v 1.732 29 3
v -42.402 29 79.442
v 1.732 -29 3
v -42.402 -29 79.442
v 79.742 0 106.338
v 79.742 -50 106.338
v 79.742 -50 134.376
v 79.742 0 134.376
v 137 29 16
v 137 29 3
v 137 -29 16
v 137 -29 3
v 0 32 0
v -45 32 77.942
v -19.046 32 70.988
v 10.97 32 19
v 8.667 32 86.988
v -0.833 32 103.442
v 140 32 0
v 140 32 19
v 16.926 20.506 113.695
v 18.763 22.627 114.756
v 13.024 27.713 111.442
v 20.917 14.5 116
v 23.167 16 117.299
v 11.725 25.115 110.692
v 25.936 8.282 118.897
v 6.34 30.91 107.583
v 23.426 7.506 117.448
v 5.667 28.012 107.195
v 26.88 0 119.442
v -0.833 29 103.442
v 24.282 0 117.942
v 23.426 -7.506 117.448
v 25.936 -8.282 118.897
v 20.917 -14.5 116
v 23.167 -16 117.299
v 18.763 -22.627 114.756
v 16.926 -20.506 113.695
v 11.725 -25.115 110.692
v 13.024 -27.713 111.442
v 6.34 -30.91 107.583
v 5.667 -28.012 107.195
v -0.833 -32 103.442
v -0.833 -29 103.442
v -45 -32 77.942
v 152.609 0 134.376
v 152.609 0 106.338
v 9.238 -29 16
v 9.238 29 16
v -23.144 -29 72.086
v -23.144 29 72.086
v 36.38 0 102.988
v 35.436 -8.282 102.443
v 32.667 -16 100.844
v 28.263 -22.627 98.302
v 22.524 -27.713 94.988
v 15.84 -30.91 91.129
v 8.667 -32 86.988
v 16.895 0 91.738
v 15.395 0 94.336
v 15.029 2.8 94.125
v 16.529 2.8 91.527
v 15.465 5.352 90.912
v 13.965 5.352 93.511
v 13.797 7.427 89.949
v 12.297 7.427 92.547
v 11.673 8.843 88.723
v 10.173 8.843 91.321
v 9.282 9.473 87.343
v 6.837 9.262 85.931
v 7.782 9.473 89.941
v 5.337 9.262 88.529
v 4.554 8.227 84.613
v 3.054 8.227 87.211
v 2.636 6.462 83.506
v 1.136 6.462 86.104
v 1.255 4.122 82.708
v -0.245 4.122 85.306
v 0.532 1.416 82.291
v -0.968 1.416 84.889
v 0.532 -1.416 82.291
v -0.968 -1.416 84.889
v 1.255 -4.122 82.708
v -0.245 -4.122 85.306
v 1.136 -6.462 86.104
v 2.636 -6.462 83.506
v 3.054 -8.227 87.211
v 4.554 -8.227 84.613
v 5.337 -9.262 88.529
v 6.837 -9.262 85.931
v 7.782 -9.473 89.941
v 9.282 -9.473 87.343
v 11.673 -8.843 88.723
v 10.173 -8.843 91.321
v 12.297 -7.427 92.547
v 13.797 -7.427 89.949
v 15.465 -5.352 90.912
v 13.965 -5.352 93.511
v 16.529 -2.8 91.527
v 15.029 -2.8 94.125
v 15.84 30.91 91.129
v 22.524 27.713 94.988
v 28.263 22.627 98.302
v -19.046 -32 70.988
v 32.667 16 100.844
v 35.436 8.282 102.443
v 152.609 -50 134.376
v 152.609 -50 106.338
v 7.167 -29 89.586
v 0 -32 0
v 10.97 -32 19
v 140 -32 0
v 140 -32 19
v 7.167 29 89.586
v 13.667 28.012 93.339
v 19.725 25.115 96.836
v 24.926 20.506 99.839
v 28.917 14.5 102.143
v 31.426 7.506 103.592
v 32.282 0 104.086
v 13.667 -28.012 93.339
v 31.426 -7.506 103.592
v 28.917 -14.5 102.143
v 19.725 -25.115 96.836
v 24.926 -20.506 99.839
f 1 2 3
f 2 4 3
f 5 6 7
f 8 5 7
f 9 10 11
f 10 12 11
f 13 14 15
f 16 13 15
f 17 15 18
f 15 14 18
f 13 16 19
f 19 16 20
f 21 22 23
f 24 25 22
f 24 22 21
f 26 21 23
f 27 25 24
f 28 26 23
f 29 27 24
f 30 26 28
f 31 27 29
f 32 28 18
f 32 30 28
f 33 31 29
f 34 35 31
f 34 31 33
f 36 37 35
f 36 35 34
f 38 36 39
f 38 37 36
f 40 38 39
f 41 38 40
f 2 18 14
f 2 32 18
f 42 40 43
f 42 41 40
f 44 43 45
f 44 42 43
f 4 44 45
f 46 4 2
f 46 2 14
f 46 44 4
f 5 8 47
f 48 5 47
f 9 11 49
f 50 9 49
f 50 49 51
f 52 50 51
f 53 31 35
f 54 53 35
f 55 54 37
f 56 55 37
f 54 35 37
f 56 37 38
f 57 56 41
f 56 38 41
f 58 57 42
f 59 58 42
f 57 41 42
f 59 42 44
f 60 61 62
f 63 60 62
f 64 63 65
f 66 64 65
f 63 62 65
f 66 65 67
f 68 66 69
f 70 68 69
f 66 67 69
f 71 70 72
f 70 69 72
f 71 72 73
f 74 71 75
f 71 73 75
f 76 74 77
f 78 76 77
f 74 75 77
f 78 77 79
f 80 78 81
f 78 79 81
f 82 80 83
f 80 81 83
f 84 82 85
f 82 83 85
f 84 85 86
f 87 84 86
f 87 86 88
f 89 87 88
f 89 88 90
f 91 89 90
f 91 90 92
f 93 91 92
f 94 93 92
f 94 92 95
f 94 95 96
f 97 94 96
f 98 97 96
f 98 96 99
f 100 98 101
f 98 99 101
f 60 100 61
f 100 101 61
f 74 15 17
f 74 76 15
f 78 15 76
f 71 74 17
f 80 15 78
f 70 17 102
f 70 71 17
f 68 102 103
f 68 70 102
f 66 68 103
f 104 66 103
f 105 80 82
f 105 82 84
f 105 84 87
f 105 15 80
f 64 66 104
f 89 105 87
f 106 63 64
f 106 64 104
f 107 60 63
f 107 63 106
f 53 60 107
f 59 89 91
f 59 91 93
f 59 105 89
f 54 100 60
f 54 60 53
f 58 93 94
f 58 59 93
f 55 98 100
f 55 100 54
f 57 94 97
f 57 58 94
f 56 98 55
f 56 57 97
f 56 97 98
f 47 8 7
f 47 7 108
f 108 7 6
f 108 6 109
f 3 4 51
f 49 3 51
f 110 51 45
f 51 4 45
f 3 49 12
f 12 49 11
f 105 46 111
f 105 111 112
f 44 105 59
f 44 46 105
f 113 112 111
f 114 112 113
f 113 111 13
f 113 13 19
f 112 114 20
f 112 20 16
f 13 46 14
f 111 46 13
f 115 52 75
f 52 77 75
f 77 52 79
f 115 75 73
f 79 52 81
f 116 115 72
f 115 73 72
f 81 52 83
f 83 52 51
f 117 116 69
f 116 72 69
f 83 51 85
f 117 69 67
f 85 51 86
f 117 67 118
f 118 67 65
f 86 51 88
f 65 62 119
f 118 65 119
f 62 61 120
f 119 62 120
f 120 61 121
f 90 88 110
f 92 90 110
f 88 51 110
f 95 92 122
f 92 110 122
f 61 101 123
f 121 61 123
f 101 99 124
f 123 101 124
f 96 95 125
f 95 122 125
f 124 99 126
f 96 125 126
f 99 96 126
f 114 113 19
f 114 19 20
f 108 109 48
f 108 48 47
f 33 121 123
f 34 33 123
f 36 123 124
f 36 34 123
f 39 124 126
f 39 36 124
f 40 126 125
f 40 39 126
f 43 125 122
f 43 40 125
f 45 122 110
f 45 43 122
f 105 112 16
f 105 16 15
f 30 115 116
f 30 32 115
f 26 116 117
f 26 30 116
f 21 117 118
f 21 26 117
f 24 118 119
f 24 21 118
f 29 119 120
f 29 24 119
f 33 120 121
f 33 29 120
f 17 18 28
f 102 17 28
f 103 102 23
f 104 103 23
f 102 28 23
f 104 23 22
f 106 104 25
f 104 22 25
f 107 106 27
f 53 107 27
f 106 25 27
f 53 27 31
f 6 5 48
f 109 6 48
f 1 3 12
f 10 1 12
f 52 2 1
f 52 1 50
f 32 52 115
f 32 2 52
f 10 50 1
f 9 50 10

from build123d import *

# Parameters (mm, degrees)
F1_DEPTH = 32
F3_DEPTH = 19
F4_T     = -3
F5_R     = 9.5
F6_DEPTH = 3
F7_W     = 72.8673189878
F7_H     = 28.0379503965
F8_DEPTH = 50


# Not quite as in the source:
# - a feature names something its author has since deleted; it is built from what else it names


with BuildPart() as f1:
    # F0 (on Front) → F1 (new body, symmetric)
    with BuildSketch(Plane.XZ):
        Polygon((-45, 77.9422863406), (0, 0), (140, 0), (140, 19), (10.9696551146, 19), (-19.0455173281, 70.9878036687), (36.3801085141, 102.9878036687), (26.8801085141, 119.4422863406), align=None)
    extrude(amount=F1_DEPTH, both=True)

    # F2 (on face) → F3 (cut, through all)
    with BuildSketch(Plane(origin=(-45, 0, 77.9422863406), x_dir=(0.8660254038, 0, 0.5), z_dir=(-0.5, 0, 0.8660254038))):
        with BuildLine():
            Line((83, -32), (83, 0))
            ThreePointArc((83, 0), (73.627416998, -22.627416998), (51, -32))
            Line((51, -32), (83, -32))
        make_face()
        with BuildLine():
            ThreePointArc((51, 32), (73.627416998, 22.627416998), (83, 0))
            Line((83, 0), (83, 32))
            Line((83, 32), (51, 32))
        make_face()
    extrude(amount=-F3_DEPTH, mode=Mode.SUBTRACT)

    # F4
    f4_openings = [f1.faces().sort_by_distance(p)[0] for p in [
        (-11.74342, 0, 97.142982),
    ]]
    offset(amount=F4_T, openings=f4_openings, kind=Kind.INTERSECTION)

    # F5 (on face) → F6 (cut, through all)
    with BuildSketch(Plane(origin=(-37, 0, 64.08587988), x_dir=(0.8660254038, 0, 0.5), z_dir=(-0.5, 0, 0.8660254038))):
        with Locations((51, 0)):
            Circle(F5_R)
    extrude(amount=-F6_DEPTH, mode=Mode.SUBTRACT)


with BuildPart() as f8:
    # F7 (on Front) → F8 (new body)
    with BuildSketch(Plane.XZ):
        with Locations((116.1752715707, 120.3569099307)):
            Rectangle(F7_W, F7_H)
    extrude(amount=F8_DEPTH)


solid = Compound([f1.part, f8.part])
